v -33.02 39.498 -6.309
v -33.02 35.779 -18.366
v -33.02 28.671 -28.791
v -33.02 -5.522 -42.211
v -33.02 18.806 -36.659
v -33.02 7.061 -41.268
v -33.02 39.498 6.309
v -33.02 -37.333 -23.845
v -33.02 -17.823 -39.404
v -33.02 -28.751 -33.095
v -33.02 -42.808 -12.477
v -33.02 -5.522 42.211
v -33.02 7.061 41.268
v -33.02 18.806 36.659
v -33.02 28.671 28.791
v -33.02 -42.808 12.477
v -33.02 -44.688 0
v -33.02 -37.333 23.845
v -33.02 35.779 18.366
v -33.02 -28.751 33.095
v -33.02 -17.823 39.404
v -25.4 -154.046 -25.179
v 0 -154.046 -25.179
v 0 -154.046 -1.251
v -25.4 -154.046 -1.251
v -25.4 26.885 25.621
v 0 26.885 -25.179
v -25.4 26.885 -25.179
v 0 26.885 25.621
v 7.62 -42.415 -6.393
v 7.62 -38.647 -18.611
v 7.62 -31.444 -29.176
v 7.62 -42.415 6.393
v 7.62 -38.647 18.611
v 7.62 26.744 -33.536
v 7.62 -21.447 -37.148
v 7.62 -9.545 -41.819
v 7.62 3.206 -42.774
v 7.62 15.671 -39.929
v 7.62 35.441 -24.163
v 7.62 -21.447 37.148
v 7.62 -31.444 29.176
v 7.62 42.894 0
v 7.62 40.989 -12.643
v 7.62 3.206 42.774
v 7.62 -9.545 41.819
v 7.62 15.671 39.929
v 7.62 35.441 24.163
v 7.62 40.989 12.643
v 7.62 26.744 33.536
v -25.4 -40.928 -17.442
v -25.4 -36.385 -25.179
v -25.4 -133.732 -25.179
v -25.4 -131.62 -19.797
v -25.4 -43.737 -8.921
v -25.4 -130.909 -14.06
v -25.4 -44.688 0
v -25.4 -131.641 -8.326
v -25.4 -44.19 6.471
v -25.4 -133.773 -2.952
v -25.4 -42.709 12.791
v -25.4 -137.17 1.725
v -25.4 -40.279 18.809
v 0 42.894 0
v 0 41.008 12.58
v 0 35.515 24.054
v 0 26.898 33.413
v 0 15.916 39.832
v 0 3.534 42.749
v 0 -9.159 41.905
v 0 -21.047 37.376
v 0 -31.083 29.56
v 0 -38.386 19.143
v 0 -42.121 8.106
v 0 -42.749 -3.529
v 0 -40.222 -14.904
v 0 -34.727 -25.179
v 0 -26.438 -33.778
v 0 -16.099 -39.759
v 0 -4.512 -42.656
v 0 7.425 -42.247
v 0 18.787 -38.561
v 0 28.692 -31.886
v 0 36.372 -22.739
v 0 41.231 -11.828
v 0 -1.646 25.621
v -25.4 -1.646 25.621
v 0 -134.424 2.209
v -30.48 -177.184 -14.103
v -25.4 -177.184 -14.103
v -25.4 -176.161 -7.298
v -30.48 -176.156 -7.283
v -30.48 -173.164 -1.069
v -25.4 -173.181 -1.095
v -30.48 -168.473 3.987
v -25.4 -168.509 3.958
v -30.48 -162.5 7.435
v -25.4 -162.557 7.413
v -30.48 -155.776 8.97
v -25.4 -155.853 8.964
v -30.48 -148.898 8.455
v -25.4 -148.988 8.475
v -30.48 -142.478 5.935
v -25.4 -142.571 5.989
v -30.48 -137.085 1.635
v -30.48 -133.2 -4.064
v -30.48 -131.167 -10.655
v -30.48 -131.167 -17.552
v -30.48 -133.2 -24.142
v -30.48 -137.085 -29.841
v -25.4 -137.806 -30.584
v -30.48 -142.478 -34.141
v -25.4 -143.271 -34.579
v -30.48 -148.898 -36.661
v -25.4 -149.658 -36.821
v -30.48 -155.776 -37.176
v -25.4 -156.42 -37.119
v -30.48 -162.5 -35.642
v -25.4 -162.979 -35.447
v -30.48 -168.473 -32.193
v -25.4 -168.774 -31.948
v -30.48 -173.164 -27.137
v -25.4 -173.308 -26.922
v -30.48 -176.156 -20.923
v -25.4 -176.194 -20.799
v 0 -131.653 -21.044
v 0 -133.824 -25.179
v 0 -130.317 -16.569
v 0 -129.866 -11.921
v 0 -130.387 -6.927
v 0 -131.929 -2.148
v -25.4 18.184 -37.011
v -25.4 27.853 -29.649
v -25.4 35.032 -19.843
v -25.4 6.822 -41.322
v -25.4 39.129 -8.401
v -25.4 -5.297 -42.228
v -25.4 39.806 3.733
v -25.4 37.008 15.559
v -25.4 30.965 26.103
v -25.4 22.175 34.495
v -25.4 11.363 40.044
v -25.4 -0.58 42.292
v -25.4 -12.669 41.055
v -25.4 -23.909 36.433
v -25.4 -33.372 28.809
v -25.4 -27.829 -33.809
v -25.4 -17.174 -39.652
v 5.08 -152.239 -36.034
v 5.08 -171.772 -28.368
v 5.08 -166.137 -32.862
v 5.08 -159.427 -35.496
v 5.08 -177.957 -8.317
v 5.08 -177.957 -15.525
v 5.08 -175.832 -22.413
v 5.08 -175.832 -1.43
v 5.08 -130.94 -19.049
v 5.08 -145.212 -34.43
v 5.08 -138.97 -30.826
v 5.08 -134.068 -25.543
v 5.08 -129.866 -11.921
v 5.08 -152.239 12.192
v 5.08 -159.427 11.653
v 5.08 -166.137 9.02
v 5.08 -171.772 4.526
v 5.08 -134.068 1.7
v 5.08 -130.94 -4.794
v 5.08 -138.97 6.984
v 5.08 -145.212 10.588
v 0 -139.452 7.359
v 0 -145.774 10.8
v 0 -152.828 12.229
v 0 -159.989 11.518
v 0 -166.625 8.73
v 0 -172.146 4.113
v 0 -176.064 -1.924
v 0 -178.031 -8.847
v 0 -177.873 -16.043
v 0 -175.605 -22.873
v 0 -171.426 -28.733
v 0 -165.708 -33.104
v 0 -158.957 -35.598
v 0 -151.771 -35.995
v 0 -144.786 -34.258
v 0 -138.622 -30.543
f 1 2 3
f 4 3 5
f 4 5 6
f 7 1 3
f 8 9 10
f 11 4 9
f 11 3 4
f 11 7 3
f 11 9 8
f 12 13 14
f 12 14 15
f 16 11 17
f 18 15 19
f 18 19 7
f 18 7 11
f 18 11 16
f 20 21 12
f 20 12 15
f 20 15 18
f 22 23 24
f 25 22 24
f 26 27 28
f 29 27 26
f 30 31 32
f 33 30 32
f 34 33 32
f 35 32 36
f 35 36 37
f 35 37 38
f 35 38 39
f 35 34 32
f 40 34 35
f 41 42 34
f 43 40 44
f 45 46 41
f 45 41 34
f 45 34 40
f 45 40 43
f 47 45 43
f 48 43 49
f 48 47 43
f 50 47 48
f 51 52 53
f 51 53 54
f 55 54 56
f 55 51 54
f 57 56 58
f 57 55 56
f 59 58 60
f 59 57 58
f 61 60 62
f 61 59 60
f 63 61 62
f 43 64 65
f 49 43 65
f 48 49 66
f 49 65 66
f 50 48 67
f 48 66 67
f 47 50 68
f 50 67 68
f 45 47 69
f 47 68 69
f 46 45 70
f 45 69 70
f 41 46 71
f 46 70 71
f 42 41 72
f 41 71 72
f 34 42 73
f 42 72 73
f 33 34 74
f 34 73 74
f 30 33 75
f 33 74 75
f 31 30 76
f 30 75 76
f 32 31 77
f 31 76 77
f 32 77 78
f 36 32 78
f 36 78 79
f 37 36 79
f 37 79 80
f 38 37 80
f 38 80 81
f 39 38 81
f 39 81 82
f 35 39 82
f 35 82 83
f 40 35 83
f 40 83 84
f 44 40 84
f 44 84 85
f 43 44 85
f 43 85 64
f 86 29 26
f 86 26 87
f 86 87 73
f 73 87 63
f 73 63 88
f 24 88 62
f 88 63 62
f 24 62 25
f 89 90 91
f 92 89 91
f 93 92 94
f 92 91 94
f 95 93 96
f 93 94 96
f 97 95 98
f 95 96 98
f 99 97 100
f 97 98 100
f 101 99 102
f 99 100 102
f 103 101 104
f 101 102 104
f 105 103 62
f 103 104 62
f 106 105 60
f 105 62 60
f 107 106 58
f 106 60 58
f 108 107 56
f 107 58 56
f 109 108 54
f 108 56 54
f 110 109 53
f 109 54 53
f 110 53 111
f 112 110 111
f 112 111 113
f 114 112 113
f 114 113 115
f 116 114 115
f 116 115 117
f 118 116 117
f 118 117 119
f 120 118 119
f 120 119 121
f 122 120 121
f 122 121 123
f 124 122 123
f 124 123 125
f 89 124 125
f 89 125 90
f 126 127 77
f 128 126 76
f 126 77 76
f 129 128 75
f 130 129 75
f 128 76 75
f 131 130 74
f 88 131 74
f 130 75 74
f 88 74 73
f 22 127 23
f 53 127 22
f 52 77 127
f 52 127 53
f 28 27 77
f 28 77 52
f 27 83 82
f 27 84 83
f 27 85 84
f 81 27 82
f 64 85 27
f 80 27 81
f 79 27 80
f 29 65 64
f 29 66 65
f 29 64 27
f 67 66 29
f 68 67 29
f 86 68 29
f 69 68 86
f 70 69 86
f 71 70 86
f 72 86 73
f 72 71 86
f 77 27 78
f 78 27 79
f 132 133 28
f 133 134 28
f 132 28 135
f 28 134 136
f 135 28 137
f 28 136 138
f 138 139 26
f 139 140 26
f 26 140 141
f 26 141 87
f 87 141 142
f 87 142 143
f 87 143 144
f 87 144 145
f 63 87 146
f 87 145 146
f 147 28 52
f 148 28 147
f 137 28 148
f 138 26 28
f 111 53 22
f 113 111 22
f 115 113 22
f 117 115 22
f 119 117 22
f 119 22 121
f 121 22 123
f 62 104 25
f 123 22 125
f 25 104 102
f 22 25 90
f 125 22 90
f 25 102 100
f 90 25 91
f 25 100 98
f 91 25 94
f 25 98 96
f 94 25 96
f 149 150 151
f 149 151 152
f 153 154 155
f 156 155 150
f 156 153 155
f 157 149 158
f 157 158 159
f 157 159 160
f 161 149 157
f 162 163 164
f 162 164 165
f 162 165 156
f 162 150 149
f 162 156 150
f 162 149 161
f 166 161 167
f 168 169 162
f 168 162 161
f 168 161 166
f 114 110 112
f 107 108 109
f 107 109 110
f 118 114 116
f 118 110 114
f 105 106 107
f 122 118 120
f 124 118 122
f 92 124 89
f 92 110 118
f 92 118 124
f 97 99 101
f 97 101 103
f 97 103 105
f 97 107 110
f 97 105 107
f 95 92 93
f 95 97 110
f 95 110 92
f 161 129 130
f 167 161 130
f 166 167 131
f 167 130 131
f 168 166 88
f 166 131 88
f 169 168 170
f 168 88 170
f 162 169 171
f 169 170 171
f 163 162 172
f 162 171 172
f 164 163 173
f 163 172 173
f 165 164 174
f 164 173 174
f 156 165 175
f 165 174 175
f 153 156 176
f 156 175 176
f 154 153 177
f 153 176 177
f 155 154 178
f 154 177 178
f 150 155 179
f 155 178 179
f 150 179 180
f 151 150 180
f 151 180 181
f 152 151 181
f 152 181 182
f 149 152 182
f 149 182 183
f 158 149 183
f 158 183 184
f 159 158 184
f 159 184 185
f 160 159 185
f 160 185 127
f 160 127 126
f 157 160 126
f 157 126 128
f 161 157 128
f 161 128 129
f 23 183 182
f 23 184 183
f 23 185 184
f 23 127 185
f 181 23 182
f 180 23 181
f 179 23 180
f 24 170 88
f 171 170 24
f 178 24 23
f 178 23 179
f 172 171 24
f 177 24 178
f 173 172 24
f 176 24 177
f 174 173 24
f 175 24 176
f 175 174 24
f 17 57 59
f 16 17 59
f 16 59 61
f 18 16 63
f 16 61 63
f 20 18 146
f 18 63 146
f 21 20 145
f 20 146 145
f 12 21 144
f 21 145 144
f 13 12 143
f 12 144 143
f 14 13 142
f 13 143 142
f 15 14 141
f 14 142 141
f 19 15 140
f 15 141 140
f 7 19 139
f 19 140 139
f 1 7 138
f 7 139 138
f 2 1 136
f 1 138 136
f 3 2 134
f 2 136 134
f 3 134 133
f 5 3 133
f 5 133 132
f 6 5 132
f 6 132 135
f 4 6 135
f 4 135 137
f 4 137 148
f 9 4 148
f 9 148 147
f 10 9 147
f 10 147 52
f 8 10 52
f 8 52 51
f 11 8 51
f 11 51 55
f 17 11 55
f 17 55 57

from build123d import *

# Parameters (mm, degrees)
F0_R         = 42.8944136966
F1_DEPTH     = 7.62
F2_W         = 53.9315019637
F2_H         = 50.8
F3_DEPTH     = 25.4
F4_DEPTH     = 127
F5_R         = 42.3296228718
F6_DEPTH     = 7.62
F7_R         = 23.1378072787
F8_DEPTH     = 5.08
F9_R         = 24.1805765137
F10_DEPTH    = 5.08
F11_T1_DEPTH = 25.4


# Not quite as in the source:
# - a fillet or chamfer that OpenCascade refuses, or shapes differently, is made with other operations: its cross-section is extruded or revolved along the edge and cut away or added


with BuildPart() as f1:
    # F0 (on Right) → F1 (new body)
    with BuildSketch(Plane.YZ):
        Circle(F0_R)
    extrude(amount=F1_DEPTH)

    # F2 (on face) → F3 (join)
    with BuildSketch(Plane(origin=(0, 0, 0), x_dir=(0, -1, 0), z_dir=(-1, 0, 0))):
        with Locations((0.0807167962, 0.2214573324)):
            Rectangle(F2_W, F2_H)
    extrude(amount=F3_DEPTH)

    # F4 (add): a face of the model
    f4_faces = [f1.faces().sort_by_distance(p)[0] for p in [
        (-12.7, -27.0464677781, 0.2214573324),
    ]]
    extrude(f4_faces, amount=F4_DEPTH)

    # F5 (on face) → F6 (join)
    with BuildSketch(Plane(origin=(-25.4, 0, 0), x_dir=(0, -1, 0), z_dir=(-1, 0, 0))):
        with Locations((2.3584635928, 0)):
            Circle(F5_R)
    extrude(amount=F6_DEPTH)

    # F7 (on face) → F8 (join)
    with BuildSketch(Plane(origin=(-25.4, 0, 0), x_dir=(0, -1, 0), z_dir=(-1, 0, 0))):
        with Locations((154.0464677781, -14.1031453386)):
            Circle(F7_R)
    extrude(amount=F8_DEPTH)

    # F9 (on face) → F10 (join)
    with BuildSketch(Plane.YZ):
        with Locations((-154.0464677781, -11.9213024154)):
            Circle(F9_R)
    extrude(amount=F10_DEPTH)

    # F11: chamfer of 152.4 x 26.87223186 on 1 edges, made by hand

    # F11_s2 → F11_t1 (cut)
    with BuildSketch(Plane.YZ.offset(-25.4)):
        Polygon((-1.6464677781, 25.6214573324), (-154.0464677781, -1.2507745276), (-154.0464677781, 25.6214573324), align=None)
    extrude(amount=F11_T1_DEPTH, mode=Mode.SUBTRACT)


solid = f1.part
